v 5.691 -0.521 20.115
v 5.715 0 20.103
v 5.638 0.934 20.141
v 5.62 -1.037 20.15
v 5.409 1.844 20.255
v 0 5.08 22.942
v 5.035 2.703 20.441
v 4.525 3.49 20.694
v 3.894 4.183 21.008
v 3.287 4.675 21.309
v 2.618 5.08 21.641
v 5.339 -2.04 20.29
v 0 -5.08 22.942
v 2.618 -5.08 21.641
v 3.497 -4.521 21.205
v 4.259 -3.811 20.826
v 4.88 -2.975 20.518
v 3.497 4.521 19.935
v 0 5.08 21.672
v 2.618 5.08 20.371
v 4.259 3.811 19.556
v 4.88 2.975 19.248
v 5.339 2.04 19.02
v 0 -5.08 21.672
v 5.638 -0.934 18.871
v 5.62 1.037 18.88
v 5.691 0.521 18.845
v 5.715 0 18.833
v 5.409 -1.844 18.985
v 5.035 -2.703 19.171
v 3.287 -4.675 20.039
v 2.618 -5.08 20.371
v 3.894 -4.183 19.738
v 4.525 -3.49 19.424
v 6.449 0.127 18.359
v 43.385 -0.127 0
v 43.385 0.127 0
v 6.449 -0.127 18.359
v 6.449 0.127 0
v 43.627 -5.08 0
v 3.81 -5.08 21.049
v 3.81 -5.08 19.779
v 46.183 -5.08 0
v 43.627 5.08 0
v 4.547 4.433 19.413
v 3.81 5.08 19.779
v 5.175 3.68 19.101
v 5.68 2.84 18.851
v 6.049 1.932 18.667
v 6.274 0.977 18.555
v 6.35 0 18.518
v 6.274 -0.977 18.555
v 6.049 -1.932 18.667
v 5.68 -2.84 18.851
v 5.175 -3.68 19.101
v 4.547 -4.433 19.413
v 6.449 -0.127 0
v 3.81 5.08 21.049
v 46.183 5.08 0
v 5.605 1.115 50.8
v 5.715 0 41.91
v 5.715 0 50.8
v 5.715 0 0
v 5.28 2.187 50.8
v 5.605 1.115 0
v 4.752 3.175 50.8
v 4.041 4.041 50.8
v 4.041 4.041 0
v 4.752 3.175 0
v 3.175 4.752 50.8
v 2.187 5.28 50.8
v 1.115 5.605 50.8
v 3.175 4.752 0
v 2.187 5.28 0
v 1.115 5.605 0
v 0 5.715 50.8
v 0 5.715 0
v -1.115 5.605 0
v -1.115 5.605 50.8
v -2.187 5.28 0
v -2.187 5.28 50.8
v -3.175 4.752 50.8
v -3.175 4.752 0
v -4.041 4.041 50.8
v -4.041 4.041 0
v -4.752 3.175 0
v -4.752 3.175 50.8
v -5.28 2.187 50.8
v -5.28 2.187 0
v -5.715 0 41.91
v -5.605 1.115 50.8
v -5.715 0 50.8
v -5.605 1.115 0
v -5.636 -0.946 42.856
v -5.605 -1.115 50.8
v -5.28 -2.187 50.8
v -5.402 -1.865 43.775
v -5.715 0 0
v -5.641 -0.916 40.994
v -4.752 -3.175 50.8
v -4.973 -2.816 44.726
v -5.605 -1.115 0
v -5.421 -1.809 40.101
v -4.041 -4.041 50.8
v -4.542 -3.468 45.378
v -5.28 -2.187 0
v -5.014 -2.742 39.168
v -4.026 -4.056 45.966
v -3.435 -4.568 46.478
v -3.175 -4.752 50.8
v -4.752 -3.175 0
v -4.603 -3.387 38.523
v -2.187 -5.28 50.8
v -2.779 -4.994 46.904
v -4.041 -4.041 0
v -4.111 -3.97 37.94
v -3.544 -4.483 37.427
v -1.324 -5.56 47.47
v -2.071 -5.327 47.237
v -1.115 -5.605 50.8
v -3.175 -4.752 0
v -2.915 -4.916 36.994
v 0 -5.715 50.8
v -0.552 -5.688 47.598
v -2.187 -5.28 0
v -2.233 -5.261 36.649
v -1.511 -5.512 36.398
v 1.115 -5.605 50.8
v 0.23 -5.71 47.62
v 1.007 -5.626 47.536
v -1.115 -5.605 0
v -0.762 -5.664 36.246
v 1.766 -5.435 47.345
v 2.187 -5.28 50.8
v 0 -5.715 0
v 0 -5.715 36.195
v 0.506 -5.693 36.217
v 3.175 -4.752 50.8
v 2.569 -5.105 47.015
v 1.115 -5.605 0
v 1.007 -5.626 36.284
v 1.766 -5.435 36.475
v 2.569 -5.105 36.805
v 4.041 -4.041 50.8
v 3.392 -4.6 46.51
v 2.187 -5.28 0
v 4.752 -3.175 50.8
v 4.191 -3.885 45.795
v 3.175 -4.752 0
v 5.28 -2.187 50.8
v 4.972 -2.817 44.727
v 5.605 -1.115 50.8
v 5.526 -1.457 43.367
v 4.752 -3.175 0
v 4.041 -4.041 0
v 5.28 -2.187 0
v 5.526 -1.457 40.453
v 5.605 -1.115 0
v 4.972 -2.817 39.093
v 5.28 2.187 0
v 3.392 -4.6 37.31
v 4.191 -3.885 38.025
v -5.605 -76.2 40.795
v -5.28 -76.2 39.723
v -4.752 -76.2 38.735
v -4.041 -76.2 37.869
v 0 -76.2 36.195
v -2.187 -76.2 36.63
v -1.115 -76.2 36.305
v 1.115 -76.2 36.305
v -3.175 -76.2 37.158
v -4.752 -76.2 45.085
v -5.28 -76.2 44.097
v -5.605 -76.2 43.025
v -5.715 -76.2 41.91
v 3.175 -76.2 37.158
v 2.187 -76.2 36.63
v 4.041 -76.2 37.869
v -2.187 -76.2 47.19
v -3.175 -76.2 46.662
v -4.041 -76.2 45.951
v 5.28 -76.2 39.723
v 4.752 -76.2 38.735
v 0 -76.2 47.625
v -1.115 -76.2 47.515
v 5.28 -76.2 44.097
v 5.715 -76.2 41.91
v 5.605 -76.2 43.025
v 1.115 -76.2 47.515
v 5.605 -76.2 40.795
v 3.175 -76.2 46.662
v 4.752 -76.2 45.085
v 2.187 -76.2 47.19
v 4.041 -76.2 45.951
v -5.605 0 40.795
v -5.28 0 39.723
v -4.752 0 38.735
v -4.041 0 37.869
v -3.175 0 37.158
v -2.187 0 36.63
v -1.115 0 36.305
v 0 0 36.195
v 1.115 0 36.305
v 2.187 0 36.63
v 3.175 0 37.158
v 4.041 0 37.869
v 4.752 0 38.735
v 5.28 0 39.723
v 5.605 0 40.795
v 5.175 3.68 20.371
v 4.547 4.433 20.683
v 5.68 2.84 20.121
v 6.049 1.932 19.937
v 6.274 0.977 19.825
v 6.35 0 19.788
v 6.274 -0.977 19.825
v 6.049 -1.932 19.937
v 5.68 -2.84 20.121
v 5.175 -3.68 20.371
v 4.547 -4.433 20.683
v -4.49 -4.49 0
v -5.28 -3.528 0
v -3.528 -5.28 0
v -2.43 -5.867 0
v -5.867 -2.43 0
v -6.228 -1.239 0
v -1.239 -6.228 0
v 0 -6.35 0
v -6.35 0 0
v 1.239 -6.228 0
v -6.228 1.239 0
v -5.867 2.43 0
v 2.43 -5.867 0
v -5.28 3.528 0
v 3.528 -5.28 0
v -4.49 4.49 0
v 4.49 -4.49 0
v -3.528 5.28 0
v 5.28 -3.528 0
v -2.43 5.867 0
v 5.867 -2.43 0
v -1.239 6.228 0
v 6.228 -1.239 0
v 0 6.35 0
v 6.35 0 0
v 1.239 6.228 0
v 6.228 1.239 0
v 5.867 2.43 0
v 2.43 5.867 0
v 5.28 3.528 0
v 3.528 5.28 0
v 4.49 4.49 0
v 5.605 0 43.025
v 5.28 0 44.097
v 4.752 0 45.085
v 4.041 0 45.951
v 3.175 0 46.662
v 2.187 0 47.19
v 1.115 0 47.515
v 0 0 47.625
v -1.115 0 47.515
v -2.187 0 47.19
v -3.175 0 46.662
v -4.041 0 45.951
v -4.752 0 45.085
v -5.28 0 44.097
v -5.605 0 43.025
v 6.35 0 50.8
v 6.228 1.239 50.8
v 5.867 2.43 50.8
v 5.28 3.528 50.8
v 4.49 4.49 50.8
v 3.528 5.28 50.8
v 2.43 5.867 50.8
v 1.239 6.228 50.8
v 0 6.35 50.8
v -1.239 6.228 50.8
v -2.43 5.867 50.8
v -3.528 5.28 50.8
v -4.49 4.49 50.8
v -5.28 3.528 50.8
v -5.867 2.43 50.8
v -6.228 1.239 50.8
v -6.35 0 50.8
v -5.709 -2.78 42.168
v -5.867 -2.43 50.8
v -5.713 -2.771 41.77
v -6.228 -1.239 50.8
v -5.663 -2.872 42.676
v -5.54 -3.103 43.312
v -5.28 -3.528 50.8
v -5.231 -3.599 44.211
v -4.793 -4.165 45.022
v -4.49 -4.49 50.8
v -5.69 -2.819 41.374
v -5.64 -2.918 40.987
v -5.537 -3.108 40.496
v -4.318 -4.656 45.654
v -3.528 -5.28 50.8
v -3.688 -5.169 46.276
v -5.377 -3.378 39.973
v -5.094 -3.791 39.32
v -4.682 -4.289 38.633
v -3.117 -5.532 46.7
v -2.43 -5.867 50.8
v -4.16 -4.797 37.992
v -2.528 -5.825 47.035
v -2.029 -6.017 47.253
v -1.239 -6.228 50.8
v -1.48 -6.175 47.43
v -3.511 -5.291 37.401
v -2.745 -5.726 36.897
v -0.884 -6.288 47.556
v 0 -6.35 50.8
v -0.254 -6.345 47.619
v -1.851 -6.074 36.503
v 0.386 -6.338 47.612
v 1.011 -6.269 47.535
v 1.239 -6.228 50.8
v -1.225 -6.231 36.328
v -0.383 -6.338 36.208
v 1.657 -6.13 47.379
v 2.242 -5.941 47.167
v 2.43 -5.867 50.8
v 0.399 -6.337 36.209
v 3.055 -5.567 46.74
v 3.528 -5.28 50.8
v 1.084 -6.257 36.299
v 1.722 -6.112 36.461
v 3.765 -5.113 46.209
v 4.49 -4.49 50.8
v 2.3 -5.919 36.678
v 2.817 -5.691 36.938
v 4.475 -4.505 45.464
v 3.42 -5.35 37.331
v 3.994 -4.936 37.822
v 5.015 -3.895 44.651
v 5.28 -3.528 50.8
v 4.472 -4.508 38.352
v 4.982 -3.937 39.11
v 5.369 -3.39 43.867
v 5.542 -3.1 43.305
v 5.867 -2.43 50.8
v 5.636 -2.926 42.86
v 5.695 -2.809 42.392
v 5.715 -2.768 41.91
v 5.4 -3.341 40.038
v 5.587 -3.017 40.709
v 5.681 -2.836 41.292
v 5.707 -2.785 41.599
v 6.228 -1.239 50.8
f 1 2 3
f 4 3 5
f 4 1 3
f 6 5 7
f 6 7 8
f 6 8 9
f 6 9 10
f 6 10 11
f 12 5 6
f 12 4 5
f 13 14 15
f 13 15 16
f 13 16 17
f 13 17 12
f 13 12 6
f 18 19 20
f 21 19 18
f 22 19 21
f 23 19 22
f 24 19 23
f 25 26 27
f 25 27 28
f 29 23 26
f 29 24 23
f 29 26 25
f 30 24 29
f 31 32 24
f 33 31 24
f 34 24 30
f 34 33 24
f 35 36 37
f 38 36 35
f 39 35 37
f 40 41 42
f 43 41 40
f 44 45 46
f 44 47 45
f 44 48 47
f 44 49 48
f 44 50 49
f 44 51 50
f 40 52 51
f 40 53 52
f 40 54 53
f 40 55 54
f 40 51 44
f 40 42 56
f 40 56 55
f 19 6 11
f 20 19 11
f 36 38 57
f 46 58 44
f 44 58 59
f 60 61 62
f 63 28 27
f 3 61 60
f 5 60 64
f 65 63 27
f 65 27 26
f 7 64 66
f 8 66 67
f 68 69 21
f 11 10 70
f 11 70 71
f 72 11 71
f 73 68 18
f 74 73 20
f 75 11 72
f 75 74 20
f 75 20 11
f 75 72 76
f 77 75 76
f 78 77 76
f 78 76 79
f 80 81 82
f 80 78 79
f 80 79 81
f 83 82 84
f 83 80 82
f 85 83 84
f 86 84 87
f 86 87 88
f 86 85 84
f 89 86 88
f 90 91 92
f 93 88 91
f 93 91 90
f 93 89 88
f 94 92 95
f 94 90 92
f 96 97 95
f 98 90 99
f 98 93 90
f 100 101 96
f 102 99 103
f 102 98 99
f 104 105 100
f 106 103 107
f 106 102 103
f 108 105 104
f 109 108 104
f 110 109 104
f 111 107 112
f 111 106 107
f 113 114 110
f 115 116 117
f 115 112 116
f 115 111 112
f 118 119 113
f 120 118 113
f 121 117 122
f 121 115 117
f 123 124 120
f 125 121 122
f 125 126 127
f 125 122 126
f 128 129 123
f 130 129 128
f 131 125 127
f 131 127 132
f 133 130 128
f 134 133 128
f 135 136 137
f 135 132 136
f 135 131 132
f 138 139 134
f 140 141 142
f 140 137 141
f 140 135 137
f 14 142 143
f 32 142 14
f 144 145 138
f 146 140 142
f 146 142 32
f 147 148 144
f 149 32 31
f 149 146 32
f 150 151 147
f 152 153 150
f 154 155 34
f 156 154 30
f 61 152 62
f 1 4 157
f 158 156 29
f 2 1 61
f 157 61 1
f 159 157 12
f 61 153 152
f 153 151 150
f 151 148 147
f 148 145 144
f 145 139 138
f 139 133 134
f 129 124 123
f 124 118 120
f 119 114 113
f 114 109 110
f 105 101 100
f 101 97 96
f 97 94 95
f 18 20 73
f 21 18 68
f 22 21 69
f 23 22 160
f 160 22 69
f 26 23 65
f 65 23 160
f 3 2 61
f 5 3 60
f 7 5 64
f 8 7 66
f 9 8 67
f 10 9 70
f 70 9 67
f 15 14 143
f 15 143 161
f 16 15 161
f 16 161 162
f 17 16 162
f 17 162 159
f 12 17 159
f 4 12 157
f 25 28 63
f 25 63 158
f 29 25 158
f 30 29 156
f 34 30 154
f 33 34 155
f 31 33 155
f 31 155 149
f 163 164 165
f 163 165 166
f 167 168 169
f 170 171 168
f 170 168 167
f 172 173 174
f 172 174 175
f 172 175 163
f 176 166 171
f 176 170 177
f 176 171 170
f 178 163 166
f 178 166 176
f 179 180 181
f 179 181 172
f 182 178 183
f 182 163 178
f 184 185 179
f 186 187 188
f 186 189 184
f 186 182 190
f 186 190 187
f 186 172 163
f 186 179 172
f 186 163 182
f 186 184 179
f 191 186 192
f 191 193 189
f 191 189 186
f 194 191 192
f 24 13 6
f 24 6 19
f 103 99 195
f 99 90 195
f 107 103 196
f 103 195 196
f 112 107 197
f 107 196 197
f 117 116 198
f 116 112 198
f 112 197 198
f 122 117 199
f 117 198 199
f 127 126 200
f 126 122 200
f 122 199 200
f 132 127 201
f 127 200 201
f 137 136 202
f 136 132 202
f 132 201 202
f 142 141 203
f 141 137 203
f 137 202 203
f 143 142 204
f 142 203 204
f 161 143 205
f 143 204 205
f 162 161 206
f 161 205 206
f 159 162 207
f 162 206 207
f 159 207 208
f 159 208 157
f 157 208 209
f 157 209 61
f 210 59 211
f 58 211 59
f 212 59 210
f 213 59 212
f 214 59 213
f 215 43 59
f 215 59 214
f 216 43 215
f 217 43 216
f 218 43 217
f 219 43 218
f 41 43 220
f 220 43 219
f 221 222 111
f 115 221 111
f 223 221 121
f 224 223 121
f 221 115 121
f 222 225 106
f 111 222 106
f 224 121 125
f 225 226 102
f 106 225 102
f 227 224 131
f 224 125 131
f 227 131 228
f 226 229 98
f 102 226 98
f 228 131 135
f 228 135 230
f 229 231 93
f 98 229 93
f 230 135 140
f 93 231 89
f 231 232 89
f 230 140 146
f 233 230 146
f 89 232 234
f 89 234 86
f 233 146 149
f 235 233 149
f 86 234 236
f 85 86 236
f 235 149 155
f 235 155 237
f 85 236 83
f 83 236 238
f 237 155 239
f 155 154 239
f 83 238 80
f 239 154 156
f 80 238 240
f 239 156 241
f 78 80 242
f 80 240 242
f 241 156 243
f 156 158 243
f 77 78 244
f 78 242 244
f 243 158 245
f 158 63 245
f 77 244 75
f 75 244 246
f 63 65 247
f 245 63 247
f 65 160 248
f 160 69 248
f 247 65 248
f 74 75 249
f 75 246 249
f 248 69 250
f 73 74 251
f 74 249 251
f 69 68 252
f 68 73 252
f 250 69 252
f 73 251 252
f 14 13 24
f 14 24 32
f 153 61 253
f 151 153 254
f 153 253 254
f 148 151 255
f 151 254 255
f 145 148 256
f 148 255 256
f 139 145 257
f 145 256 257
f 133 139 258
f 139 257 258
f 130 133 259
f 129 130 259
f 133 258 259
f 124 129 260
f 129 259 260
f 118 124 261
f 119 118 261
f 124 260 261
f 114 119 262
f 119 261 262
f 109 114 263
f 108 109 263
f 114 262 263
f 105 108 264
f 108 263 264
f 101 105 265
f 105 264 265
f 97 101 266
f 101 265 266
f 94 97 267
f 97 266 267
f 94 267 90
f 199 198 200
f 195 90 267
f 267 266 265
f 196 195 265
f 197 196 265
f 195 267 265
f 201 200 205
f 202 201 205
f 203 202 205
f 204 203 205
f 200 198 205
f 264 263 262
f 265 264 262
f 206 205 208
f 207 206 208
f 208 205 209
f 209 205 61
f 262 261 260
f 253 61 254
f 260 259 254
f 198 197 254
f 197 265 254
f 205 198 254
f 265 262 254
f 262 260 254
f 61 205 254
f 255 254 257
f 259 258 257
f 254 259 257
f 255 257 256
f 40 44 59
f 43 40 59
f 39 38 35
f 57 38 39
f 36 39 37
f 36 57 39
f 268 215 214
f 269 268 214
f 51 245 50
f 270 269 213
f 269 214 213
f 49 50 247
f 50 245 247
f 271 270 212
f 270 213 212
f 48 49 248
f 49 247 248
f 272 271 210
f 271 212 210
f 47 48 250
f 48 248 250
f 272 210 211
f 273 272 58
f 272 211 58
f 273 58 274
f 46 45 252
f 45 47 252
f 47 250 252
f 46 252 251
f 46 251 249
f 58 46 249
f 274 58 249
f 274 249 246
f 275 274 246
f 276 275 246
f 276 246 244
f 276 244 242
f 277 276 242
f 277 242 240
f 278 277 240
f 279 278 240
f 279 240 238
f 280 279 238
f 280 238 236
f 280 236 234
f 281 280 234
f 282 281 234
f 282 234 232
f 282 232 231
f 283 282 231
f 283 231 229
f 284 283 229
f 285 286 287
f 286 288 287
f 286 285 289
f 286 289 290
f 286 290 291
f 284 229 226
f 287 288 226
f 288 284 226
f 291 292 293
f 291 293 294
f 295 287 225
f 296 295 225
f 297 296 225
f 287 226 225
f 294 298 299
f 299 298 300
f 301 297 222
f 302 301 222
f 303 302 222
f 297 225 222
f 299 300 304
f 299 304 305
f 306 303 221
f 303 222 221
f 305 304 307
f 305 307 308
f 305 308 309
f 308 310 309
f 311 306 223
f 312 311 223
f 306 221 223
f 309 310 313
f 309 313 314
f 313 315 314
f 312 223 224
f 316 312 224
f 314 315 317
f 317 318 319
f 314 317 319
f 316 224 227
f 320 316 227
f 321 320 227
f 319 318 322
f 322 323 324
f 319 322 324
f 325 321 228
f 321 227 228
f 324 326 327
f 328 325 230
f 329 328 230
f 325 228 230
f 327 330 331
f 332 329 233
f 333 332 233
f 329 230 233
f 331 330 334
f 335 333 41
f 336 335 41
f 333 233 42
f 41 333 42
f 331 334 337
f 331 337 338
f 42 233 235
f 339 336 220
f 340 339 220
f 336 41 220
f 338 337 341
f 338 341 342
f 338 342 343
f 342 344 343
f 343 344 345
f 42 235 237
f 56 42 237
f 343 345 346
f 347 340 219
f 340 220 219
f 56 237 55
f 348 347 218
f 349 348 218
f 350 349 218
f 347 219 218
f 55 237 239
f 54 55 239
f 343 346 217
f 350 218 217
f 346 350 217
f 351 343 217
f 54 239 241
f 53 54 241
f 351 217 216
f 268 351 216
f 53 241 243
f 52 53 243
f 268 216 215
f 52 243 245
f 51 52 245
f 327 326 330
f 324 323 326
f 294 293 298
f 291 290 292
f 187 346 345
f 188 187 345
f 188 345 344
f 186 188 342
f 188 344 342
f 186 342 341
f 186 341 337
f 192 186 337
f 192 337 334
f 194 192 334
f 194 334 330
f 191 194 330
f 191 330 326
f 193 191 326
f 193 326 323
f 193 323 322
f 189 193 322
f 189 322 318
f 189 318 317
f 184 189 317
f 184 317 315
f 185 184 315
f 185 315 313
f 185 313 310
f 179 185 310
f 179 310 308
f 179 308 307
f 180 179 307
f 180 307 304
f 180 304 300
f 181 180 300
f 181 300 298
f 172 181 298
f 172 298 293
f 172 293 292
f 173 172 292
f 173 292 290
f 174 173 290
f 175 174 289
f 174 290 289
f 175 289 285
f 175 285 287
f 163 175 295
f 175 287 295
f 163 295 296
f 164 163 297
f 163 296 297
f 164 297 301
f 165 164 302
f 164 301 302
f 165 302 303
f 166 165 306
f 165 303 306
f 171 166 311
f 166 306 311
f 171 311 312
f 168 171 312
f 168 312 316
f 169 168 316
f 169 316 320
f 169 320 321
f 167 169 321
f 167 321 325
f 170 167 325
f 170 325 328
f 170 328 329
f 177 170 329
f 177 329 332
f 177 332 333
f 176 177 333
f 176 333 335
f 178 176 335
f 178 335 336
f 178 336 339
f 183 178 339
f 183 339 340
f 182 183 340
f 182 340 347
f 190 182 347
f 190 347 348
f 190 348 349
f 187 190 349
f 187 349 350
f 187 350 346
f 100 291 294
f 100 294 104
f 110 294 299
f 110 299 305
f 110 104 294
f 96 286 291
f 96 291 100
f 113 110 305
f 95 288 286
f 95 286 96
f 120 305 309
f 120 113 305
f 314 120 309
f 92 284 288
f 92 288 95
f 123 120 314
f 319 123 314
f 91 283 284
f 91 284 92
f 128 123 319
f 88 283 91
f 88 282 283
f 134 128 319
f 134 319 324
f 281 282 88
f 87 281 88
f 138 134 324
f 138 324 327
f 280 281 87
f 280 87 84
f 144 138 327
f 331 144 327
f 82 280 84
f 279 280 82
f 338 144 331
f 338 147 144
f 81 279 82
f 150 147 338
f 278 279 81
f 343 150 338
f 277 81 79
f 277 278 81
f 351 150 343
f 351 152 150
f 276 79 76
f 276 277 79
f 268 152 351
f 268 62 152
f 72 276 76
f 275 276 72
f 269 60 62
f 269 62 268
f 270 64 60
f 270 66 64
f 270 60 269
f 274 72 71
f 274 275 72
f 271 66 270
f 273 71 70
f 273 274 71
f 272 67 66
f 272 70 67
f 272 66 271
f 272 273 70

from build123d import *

# Parameters (mm, degrees)
F0_R     = 6.35
F0_R_2   = 5.715
F1_DEPTH = 50.8
F2_R     = 5.715
F3_DEPTH = 76.2
F5_DEPTH = 5.08
F7_DEPTH = 0.127


with BuildPart() as f1:
    # F0 (on Top) → F1 (new body)
    with BuildSketch(Plane.XY):
        Circle(F0_R)
        Circle(F0_R_2, mode=Mode.SUBTRACT)
    extrude(amount=F1_DEPTH)

    # F2 (on Front) → F3 (join)
    with BuildSketch(Plane.XZ):
        with Locations((0, 41.91)):
            Circle(F2_R)
    extrude(amount=F3_DEPTH)

    # F4 (on Front) → F5 (join, symmetric)
    with BuildSketch(Plane.XZ):
        Polygon((46.1834855378, 0), (0, 22.9420270771), (0, 21.6720270771), (43.6269099381, 0), align=None)
    extrude(amount=F5_DEPTH, both=True)


with BuildPart() as f7:
    # F6 (on Front) → F7 (new body, symmetric)
    with BuildSketch(Plane.XZ):
        Polygon((43.384578079, 0), (6.4489128999, 18.3588717035), (6.4489128999, 0), align=None)
    extrude(amount=F7_DEPTH, both=True)


solid = Compound([f1.part, f7.part])
